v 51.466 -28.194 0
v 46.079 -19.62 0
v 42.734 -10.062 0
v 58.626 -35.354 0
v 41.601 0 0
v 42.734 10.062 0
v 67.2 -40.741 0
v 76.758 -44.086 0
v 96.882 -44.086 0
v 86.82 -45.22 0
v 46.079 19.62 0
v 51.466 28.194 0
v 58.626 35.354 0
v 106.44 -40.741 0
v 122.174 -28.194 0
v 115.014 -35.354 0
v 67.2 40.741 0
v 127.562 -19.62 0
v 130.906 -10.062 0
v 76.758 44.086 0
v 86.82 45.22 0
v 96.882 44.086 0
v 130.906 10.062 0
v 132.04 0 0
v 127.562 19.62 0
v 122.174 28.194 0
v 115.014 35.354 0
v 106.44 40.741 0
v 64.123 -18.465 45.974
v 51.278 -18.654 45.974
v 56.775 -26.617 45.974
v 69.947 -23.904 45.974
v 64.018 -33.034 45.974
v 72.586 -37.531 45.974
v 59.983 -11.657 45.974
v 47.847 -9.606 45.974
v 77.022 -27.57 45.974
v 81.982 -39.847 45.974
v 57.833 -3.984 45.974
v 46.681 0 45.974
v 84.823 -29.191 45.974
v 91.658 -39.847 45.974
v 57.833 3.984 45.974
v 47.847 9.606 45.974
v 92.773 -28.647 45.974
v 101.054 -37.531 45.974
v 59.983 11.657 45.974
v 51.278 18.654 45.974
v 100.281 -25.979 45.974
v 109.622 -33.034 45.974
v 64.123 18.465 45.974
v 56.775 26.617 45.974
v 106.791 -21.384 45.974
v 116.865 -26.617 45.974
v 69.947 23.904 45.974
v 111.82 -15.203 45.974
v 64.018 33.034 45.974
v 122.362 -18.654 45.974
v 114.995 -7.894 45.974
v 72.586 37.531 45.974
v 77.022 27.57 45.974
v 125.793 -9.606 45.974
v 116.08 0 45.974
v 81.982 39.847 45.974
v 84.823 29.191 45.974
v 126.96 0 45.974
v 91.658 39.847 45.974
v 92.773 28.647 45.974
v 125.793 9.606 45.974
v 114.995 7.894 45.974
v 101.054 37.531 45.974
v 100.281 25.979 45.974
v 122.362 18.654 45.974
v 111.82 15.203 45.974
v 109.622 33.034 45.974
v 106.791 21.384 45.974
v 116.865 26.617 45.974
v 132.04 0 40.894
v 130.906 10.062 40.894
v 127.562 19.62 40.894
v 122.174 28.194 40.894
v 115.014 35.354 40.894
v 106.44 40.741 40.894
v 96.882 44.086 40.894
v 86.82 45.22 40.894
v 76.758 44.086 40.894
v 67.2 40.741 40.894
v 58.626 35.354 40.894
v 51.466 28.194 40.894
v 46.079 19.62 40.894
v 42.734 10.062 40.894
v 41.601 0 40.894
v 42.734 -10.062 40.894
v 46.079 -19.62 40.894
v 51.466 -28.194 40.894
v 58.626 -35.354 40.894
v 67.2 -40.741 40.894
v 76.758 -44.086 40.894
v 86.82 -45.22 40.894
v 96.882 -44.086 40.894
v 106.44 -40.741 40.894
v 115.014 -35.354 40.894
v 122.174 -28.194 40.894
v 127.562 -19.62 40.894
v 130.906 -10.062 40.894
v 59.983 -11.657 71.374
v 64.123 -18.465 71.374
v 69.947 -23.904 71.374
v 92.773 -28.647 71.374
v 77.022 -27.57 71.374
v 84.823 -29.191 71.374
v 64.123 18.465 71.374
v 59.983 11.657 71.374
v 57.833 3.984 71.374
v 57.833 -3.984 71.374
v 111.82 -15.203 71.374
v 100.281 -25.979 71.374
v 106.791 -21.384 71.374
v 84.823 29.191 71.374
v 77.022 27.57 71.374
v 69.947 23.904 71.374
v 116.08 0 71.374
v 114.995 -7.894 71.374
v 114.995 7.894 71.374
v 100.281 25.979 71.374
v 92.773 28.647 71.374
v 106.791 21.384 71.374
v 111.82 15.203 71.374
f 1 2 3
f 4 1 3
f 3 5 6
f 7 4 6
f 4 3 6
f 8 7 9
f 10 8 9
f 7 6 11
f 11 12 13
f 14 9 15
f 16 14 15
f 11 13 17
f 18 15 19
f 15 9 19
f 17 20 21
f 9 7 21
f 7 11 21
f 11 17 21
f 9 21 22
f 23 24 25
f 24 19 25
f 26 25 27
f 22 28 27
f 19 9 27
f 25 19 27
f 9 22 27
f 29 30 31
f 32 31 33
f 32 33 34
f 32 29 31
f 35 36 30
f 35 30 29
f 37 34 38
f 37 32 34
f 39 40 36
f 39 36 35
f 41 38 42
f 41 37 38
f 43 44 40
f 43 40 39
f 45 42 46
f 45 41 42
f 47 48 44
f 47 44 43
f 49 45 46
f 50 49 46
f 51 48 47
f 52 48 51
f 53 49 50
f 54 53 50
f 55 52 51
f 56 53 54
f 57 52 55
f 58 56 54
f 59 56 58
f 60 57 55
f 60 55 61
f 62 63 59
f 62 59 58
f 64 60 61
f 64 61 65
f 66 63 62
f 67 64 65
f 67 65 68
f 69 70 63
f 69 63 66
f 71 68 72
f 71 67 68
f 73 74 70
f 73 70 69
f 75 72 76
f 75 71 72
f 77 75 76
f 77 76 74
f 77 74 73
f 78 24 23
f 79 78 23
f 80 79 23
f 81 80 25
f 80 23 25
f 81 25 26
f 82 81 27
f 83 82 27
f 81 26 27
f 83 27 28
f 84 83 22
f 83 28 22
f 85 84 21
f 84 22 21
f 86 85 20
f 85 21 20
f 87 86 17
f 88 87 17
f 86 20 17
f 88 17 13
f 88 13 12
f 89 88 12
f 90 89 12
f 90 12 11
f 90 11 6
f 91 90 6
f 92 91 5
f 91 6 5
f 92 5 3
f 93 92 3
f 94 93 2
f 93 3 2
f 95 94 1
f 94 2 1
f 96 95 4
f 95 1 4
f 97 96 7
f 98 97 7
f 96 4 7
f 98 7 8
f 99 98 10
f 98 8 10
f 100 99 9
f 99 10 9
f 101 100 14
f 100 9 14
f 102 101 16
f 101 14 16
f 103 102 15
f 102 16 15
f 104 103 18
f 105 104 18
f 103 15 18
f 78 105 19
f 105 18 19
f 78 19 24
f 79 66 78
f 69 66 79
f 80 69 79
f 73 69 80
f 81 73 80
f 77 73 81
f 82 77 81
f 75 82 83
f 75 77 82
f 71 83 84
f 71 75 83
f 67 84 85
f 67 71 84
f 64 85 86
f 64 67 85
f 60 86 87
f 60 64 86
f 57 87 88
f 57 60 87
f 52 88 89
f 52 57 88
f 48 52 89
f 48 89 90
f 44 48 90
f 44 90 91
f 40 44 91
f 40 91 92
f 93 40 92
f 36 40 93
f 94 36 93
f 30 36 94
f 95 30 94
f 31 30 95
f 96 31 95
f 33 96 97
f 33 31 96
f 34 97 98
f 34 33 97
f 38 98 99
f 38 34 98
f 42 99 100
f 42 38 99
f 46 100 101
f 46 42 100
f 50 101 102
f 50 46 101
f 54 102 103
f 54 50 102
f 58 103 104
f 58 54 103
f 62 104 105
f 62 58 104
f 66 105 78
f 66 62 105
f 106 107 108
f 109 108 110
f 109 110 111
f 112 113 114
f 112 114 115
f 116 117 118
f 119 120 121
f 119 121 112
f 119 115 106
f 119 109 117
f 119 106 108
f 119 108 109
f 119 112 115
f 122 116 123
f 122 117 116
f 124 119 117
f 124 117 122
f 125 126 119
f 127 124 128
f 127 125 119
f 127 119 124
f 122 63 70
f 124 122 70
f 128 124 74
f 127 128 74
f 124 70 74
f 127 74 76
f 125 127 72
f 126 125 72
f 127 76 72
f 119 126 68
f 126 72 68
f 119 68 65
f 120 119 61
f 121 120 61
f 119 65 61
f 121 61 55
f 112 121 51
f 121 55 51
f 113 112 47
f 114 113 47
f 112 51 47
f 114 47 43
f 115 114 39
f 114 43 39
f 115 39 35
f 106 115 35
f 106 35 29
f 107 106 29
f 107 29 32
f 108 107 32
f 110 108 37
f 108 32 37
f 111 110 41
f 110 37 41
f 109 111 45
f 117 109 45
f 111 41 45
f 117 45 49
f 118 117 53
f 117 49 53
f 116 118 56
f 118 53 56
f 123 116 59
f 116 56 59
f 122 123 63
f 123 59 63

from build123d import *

# Parameters (mm, degrees)
F0_R     = 45.219595
F1_DEPTH = 45.974
F2_SIZE  = 5.08
F3_R     = 29.259427
F4_DEPTH = 25.4


with BuildPart() as f1:
    # F0 (on Top) → F1 (new body)
    with BuildSketch(Plane.XY):
        with Locations((86.820111, 0)):
            Circle(F0_R)
    extrude(amount=F1_DEPTH)

    # F2
    f2_edges = [f1.edges().sort_by_distance(p)[0] for p in [
        (41.600516, 0, 45.974),
    ]]
    chamfer(f2_edges, length=F2_SIZE)

    # F3 (on face) → F4 (join)
    with BuildSketch(Plane.XY.offset(45.974)):
        with Locations((86.820111, 0)):
            Circle(F3_R)
    extrude(amount=F4_DEPTH)


solid = f1.part
